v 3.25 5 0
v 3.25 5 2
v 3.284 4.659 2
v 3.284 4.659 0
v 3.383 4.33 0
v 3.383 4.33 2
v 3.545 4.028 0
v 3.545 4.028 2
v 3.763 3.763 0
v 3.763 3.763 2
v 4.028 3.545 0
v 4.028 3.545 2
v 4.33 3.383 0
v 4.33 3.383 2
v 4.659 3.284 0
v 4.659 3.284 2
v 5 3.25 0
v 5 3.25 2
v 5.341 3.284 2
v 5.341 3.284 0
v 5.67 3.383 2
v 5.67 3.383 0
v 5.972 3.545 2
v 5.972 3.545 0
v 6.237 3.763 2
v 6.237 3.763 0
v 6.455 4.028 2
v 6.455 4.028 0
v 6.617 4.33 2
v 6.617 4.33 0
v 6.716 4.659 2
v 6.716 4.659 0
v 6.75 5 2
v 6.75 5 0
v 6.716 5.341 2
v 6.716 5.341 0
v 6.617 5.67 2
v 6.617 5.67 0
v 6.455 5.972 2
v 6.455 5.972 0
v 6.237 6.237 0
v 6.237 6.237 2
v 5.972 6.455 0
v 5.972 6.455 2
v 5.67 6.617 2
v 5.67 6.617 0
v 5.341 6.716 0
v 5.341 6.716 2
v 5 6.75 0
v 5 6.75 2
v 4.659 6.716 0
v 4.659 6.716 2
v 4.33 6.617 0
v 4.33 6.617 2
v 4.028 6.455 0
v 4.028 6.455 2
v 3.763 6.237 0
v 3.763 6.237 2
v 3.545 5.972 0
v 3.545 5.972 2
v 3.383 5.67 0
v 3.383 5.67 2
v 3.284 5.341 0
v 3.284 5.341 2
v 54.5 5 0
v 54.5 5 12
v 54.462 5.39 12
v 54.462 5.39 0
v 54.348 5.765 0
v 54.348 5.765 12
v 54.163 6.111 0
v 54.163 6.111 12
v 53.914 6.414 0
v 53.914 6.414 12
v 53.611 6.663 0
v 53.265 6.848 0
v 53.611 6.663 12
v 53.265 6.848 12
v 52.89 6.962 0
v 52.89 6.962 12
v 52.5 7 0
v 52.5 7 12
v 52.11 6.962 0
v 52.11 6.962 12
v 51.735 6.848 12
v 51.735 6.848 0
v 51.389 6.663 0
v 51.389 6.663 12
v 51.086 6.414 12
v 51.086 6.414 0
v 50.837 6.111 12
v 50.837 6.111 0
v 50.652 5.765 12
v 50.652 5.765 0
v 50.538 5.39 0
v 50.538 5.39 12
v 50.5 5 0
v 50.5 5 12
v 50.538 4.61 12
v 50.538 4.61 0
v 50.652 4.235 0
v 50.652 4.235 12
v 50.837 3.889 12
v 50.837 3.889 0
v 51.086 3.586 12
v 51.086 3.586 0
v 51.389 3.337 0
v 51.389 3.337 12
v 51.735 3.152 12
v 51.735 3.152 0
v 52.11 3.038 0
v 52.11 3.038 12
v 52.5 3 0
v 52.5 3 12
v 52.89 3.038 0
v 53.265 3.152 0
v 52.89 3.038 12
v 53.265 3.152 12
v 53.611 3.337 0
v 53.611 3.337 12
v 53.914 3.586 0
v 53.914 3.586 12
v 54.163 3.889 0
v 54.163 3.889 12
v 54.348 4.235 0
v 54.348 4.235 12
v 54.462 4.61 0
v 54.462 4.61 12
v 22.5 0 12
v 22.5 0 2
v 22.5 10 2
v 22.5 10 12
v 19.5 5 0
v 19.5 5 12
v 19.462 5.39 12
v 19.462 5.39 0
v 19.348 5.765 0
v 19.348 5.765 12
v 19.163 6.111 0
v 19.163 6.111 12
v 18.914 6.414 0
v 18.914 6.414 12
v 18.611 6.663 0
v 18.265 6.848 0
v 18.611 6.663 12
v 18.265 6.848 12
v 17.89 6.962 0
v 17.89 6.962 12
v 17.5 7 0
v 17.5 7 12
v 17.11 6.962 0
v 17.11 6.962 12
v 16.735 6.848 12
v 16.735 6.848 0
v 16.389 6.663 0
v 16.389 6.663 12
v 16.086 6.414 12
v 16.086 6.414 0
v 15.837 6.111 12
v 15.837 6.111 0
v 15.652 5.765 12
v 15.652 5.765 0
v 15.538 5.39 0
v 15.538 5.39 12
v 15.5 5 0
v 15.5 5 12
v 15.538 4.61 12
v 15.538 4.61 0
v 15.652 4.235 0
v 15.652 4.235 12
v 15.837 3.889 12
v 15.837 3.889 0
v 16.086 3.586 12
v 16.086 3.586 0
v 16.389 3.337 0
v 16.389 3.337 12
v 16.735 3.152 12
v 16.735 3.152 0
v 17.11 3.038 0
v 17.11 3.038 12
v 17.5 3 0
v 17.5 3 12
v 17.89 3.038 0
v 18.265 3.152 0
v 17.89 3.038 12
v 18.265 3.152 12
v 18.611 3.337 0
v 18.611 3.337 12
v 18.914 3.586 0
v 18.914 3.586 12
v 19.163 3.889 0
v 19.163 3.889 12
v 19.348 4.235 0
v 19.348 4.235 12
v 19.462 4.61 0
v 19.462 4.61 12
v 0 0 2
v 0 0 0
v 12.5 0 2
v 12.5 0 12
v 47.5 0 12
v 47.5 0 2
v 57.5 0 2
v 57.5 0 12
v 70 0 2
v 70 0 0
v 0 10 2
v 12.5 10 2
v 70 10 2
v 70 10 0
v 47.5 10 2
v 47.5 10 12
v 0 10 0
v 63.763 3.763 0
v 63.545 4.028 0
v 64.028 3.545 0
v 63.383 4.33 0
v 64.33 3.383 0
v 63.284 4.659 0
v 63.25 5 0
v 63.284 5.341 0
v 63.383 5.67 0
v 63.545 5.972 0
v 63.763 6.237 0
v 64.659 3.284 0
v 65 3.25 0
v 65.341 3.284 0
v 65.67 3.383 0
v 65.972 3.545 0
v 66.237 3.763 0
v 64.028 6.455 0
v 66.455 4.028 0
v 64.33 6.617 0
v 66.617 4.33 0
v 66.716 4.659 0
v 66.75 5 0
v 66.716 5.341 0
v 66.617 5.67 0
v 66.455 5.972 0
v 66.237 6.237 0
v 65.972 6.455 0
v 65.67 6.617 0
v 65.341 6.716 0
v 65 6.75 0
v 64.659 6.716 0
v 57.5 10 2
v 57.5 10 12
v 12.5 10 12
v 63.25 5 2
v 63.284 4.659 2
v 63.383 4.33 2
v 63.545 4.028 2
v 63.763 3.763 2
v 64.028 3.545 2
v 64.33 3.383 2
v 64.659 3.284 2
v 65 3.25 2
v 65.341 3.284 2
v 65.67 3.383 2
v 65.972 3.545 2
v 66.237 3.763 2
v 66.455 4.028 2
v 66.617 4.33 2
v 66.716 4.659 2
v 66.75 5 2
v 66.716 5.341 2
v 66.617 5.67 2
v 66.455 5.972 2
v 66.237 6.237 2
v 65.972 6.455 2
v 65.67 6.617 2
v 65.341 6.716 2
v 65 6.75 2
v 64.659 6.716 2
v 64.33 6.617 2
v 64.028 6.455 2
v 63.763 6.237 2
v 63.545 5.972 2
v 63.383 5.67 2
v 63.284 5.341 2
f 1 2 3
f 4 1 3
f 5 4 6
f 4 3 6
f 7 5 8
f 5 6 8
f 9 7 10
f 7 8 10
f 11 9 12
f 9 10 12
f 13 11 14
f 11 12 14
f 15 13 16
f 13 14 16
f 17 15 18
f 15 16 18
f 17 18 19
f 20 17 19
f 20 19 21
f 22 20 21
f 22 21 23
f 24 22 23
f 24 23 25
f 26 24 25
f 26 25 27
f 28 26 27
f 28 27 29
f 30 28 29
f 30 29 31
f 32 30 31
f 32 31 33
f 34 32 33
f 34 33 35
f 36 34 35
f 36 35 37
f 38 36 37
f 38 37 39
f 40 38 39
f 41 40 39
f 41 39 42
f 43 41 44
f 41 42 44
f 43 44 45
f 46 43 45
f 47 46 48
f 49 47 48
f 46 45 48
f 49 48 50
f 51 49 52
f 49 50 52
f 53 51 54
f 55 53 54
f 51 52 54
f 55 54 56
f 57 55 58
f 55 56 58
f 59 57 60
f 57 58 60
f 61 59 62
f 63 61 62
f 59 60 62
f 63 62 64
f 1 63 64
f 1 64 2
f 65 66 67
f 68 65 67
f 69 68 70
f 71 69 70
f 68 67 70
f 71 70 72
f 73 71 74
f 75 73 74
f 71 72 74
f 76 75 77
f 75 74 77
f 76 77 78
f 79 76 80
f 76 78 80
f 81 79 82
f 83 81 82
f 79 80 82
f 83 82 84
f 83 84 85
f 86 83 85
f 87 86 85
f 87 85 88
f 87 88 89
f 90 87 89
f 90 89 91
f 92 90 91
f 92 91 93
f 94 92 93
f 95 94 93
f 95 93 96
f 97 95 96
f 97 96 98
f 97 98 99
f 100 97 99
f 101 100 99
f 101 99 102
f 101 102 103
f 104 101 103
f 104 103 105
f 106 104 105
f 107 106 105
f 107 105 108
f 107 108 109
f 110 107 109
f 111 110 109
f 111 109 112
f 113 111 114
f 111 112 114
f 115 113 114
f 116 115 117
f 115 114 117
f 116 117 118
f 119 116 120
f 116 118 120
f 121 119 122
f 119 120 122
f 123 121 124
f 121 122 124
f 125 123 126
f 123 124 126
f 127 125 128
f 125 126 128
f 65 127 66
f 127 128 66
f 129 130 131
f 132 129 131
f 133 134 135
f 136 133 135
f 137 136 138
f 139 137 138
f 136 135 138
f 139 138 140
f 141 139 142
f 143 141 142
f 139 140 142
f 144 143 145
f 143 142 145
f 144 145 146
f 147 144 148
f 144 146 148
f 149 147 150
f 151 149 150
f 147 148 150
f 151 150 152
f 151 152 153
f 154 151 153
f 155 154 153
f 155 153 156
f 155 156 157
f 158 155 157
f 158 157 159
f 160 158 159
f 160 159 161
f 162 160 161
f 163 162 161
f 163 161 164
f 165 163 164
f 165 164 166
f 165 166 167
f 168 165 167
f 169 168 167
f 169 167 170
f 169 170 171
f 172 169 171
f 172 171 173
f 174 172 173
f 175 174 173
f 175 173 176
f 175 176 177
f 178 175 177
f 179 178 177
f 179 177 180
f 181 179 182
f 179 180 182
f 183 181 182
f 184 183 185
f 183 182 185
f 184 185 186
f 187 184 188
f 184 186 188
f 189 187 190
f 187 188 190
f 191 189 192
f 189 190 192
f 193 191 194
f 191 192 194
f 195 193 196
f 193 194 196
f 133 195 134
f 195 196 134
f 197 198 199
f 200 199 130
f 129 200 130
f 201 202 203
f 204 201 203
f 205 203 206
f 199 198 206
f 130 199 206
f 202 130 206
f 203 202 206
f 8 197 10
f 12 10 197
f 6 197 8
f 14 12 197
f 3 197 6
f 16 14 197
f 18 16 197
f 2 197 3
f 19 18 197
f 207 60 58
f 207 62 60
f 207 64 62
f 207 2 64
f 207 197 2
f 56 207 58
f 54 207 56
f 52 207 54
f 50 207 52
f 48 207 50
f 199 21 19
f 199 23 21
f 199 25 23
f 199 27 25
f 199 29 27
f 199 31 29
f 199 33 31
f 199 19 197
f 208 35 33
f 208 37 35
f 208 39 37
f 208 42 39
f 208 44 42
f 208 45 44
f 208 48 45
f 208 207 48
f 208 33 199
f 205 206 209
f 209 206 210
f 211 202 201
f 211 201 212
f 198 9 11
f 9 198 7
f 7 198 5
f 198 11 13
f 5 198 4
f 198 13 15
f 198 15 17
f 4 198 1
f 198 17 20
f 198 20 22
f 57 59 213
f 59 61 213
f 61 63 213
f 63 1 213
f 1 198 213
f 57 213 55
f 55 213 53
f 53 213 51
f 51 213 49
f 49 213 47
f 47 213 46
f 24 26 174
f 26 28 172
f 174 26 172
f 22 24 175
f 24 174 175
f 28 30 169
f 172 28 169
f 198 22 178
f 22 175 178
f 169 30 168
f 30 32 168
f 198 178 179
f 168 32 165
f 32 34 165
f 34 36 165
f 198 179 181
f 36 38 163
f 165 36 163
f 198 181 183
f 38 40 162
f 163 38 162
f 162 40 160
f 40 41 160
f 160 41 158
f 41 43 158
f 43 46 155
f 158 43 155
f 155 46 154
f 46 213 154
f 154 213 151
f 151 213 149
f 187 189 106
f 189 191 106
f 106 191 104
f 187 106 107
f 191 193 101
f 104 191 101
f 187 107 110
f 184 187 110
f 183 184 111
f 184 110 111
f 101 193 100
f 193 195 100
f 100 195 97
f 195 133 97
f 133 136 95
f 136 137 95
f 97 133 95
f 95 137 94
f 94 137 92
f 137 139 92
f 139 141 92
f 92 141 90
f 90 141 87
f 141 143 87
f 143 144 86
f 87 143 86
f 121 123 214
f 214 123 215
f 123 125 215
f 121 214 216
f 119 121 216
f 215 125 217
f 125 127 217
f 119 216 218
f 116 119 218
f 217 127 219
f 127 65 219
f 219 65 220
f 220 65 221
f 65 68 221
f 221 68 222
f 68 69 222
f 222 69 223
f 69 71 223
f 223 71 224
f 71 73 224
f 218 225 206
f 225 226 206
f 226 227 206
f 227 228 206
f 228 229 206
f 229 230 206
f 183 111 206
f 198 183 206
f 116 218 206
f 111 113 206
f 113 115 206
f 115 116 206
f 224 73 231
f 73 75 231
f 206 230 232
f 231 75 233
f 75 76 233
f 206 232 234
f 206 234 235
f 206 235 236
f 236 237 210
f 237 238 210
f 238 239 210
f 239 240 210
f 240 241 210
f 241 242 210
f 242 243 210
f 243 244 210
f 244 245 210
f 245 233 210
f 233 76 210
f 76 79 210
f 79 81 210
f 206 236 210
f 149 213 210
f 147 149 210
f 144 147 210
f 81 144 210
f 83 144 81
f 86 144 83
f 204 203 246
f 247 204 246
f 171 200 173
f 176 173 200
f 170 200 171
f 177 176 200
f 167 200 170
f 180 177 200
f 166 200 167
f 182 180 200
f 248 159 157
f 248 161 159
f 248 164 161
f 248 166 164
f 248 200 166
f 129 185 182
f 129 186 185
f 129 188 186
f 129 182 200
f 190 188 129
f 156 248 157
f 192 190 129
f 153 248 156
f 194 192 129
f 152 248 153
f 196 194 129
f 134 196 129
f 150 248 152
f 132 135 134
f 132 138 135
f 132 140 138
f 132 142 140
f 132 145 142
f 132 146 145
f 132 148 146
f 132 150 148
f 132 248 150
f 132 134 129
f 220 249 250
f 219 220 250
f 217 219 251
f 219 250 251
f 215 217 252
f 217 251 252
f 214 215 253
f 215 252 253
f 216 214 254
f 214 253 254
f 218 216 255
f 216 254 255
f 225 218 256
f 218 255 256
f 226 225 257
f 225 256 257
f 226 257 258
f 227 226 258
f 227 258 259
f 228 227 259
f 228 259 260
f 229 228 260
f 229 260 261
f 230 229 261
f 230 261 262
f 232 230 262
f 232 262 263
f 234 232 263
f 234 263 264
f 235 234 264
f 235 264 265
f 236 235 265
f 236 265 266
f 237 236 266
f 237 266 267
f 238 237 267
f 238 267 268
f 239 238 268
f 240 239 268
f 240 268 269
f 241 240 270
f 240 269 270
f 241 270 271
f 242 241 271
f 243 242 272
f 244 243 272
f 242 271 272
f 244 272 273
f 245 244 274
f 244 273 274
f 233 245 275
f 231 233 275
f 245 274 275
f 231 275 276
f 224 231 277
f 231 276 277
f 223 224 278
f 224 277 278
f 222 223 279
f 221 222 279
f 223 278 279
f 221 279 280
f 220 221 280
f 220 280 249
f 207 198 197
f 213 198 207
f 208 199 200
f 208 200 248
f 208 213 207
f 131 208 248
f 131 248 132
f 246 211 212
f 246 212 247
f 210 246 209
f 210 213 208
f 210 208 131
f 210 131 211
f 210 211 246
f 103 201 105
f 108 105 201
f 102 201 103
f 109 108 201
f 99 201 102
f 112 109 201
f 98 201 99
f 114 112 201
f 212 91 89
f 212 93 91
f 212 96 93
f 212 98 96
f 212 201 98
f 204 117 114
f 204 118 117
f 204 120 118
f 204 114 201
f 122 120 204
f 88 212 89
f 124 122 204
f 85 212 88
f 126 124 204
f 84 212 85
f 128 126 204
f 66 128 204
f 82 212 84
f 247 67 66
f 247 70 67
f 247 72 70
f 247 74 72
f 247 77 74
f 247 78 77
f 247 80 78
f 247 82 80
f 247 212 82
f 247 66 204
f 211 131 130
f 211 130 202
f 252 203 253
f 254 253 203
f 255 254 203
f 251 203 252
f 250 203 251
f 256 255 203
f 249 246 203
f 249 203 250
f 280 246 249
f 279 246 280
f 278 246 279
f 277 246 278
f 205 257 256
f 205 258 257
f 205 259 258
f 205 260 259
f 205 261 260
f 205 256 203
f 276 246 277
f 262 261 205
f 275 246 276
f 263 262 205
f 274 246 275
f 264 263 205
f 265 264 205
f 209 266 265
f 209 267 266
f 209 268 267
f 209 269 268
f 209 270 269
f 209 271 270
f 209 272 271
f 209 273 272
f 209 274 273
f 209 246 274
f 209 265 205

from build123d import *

# Parameters (mm, degrees)
ESQUISSE2_W             = 70
ESQUISSE2_H             = 10
BOSS_EXTRU_1_DEPTH      = 2
ESQUISSE3_W             = 10
ESQUISSE3_H             = 10
BOSS_EXTRU_2_DEPTH      = 10
ESQUISSE4_R             = 2
ESQUISSE4_R_2           = 1.75
ENL_V_MAT_EXTRU_1_DEPTH = 20


with BuildPart() as part:
    # Esquisse2 → Boss.-Extru.1 (new body)
    with BuildSketch(Plane.XY):
        with Locations((35, 5)):
            Rectangle(ESQUISSE2_W, ESQUISSE2_H)
    extrude(amount=BOSS_EXTRU_1_DEPTH)

    # Esquisse3 → Boss.-Extru.2 (add)
    with BuildSketch(Plane.XY.offset(2)):
        with Locations((17.5, 5)):
            Rectangle(ESQUISSE3_W, ESQUISSE3_H)
        with Locations((52.5, 5)):
            Rectangle(ESQUISSE3_W, ESQUISSE3_H)
    extrude(amount=BOSS_EXTRU_2_DEPTH)

    # Esquisse4 → Enlèv. mat.-Extru.1 (cut)
    with BuildSketch(Plane.XY.offset(12)):
        with Locations((52.5, 5)):
            Circle(ESQUISSE4_R)
        with Locations((17.5, 5)):
            Circle(ESQUISSE4_R)
        with Locations(Location((5, 5, 0), (0, 0, 180))):
            Circle(ESQUISSE4_R_2)
        with Locations(Location((65, 5, 0), (0, 0, 180))):
            Circle(ESQUISSE4_R_2)
    extrude(amount=-ENL_V_MAT_EXTRU_1_DEPTH, mode=Mode.SUBTRACT)


solid = part.part
